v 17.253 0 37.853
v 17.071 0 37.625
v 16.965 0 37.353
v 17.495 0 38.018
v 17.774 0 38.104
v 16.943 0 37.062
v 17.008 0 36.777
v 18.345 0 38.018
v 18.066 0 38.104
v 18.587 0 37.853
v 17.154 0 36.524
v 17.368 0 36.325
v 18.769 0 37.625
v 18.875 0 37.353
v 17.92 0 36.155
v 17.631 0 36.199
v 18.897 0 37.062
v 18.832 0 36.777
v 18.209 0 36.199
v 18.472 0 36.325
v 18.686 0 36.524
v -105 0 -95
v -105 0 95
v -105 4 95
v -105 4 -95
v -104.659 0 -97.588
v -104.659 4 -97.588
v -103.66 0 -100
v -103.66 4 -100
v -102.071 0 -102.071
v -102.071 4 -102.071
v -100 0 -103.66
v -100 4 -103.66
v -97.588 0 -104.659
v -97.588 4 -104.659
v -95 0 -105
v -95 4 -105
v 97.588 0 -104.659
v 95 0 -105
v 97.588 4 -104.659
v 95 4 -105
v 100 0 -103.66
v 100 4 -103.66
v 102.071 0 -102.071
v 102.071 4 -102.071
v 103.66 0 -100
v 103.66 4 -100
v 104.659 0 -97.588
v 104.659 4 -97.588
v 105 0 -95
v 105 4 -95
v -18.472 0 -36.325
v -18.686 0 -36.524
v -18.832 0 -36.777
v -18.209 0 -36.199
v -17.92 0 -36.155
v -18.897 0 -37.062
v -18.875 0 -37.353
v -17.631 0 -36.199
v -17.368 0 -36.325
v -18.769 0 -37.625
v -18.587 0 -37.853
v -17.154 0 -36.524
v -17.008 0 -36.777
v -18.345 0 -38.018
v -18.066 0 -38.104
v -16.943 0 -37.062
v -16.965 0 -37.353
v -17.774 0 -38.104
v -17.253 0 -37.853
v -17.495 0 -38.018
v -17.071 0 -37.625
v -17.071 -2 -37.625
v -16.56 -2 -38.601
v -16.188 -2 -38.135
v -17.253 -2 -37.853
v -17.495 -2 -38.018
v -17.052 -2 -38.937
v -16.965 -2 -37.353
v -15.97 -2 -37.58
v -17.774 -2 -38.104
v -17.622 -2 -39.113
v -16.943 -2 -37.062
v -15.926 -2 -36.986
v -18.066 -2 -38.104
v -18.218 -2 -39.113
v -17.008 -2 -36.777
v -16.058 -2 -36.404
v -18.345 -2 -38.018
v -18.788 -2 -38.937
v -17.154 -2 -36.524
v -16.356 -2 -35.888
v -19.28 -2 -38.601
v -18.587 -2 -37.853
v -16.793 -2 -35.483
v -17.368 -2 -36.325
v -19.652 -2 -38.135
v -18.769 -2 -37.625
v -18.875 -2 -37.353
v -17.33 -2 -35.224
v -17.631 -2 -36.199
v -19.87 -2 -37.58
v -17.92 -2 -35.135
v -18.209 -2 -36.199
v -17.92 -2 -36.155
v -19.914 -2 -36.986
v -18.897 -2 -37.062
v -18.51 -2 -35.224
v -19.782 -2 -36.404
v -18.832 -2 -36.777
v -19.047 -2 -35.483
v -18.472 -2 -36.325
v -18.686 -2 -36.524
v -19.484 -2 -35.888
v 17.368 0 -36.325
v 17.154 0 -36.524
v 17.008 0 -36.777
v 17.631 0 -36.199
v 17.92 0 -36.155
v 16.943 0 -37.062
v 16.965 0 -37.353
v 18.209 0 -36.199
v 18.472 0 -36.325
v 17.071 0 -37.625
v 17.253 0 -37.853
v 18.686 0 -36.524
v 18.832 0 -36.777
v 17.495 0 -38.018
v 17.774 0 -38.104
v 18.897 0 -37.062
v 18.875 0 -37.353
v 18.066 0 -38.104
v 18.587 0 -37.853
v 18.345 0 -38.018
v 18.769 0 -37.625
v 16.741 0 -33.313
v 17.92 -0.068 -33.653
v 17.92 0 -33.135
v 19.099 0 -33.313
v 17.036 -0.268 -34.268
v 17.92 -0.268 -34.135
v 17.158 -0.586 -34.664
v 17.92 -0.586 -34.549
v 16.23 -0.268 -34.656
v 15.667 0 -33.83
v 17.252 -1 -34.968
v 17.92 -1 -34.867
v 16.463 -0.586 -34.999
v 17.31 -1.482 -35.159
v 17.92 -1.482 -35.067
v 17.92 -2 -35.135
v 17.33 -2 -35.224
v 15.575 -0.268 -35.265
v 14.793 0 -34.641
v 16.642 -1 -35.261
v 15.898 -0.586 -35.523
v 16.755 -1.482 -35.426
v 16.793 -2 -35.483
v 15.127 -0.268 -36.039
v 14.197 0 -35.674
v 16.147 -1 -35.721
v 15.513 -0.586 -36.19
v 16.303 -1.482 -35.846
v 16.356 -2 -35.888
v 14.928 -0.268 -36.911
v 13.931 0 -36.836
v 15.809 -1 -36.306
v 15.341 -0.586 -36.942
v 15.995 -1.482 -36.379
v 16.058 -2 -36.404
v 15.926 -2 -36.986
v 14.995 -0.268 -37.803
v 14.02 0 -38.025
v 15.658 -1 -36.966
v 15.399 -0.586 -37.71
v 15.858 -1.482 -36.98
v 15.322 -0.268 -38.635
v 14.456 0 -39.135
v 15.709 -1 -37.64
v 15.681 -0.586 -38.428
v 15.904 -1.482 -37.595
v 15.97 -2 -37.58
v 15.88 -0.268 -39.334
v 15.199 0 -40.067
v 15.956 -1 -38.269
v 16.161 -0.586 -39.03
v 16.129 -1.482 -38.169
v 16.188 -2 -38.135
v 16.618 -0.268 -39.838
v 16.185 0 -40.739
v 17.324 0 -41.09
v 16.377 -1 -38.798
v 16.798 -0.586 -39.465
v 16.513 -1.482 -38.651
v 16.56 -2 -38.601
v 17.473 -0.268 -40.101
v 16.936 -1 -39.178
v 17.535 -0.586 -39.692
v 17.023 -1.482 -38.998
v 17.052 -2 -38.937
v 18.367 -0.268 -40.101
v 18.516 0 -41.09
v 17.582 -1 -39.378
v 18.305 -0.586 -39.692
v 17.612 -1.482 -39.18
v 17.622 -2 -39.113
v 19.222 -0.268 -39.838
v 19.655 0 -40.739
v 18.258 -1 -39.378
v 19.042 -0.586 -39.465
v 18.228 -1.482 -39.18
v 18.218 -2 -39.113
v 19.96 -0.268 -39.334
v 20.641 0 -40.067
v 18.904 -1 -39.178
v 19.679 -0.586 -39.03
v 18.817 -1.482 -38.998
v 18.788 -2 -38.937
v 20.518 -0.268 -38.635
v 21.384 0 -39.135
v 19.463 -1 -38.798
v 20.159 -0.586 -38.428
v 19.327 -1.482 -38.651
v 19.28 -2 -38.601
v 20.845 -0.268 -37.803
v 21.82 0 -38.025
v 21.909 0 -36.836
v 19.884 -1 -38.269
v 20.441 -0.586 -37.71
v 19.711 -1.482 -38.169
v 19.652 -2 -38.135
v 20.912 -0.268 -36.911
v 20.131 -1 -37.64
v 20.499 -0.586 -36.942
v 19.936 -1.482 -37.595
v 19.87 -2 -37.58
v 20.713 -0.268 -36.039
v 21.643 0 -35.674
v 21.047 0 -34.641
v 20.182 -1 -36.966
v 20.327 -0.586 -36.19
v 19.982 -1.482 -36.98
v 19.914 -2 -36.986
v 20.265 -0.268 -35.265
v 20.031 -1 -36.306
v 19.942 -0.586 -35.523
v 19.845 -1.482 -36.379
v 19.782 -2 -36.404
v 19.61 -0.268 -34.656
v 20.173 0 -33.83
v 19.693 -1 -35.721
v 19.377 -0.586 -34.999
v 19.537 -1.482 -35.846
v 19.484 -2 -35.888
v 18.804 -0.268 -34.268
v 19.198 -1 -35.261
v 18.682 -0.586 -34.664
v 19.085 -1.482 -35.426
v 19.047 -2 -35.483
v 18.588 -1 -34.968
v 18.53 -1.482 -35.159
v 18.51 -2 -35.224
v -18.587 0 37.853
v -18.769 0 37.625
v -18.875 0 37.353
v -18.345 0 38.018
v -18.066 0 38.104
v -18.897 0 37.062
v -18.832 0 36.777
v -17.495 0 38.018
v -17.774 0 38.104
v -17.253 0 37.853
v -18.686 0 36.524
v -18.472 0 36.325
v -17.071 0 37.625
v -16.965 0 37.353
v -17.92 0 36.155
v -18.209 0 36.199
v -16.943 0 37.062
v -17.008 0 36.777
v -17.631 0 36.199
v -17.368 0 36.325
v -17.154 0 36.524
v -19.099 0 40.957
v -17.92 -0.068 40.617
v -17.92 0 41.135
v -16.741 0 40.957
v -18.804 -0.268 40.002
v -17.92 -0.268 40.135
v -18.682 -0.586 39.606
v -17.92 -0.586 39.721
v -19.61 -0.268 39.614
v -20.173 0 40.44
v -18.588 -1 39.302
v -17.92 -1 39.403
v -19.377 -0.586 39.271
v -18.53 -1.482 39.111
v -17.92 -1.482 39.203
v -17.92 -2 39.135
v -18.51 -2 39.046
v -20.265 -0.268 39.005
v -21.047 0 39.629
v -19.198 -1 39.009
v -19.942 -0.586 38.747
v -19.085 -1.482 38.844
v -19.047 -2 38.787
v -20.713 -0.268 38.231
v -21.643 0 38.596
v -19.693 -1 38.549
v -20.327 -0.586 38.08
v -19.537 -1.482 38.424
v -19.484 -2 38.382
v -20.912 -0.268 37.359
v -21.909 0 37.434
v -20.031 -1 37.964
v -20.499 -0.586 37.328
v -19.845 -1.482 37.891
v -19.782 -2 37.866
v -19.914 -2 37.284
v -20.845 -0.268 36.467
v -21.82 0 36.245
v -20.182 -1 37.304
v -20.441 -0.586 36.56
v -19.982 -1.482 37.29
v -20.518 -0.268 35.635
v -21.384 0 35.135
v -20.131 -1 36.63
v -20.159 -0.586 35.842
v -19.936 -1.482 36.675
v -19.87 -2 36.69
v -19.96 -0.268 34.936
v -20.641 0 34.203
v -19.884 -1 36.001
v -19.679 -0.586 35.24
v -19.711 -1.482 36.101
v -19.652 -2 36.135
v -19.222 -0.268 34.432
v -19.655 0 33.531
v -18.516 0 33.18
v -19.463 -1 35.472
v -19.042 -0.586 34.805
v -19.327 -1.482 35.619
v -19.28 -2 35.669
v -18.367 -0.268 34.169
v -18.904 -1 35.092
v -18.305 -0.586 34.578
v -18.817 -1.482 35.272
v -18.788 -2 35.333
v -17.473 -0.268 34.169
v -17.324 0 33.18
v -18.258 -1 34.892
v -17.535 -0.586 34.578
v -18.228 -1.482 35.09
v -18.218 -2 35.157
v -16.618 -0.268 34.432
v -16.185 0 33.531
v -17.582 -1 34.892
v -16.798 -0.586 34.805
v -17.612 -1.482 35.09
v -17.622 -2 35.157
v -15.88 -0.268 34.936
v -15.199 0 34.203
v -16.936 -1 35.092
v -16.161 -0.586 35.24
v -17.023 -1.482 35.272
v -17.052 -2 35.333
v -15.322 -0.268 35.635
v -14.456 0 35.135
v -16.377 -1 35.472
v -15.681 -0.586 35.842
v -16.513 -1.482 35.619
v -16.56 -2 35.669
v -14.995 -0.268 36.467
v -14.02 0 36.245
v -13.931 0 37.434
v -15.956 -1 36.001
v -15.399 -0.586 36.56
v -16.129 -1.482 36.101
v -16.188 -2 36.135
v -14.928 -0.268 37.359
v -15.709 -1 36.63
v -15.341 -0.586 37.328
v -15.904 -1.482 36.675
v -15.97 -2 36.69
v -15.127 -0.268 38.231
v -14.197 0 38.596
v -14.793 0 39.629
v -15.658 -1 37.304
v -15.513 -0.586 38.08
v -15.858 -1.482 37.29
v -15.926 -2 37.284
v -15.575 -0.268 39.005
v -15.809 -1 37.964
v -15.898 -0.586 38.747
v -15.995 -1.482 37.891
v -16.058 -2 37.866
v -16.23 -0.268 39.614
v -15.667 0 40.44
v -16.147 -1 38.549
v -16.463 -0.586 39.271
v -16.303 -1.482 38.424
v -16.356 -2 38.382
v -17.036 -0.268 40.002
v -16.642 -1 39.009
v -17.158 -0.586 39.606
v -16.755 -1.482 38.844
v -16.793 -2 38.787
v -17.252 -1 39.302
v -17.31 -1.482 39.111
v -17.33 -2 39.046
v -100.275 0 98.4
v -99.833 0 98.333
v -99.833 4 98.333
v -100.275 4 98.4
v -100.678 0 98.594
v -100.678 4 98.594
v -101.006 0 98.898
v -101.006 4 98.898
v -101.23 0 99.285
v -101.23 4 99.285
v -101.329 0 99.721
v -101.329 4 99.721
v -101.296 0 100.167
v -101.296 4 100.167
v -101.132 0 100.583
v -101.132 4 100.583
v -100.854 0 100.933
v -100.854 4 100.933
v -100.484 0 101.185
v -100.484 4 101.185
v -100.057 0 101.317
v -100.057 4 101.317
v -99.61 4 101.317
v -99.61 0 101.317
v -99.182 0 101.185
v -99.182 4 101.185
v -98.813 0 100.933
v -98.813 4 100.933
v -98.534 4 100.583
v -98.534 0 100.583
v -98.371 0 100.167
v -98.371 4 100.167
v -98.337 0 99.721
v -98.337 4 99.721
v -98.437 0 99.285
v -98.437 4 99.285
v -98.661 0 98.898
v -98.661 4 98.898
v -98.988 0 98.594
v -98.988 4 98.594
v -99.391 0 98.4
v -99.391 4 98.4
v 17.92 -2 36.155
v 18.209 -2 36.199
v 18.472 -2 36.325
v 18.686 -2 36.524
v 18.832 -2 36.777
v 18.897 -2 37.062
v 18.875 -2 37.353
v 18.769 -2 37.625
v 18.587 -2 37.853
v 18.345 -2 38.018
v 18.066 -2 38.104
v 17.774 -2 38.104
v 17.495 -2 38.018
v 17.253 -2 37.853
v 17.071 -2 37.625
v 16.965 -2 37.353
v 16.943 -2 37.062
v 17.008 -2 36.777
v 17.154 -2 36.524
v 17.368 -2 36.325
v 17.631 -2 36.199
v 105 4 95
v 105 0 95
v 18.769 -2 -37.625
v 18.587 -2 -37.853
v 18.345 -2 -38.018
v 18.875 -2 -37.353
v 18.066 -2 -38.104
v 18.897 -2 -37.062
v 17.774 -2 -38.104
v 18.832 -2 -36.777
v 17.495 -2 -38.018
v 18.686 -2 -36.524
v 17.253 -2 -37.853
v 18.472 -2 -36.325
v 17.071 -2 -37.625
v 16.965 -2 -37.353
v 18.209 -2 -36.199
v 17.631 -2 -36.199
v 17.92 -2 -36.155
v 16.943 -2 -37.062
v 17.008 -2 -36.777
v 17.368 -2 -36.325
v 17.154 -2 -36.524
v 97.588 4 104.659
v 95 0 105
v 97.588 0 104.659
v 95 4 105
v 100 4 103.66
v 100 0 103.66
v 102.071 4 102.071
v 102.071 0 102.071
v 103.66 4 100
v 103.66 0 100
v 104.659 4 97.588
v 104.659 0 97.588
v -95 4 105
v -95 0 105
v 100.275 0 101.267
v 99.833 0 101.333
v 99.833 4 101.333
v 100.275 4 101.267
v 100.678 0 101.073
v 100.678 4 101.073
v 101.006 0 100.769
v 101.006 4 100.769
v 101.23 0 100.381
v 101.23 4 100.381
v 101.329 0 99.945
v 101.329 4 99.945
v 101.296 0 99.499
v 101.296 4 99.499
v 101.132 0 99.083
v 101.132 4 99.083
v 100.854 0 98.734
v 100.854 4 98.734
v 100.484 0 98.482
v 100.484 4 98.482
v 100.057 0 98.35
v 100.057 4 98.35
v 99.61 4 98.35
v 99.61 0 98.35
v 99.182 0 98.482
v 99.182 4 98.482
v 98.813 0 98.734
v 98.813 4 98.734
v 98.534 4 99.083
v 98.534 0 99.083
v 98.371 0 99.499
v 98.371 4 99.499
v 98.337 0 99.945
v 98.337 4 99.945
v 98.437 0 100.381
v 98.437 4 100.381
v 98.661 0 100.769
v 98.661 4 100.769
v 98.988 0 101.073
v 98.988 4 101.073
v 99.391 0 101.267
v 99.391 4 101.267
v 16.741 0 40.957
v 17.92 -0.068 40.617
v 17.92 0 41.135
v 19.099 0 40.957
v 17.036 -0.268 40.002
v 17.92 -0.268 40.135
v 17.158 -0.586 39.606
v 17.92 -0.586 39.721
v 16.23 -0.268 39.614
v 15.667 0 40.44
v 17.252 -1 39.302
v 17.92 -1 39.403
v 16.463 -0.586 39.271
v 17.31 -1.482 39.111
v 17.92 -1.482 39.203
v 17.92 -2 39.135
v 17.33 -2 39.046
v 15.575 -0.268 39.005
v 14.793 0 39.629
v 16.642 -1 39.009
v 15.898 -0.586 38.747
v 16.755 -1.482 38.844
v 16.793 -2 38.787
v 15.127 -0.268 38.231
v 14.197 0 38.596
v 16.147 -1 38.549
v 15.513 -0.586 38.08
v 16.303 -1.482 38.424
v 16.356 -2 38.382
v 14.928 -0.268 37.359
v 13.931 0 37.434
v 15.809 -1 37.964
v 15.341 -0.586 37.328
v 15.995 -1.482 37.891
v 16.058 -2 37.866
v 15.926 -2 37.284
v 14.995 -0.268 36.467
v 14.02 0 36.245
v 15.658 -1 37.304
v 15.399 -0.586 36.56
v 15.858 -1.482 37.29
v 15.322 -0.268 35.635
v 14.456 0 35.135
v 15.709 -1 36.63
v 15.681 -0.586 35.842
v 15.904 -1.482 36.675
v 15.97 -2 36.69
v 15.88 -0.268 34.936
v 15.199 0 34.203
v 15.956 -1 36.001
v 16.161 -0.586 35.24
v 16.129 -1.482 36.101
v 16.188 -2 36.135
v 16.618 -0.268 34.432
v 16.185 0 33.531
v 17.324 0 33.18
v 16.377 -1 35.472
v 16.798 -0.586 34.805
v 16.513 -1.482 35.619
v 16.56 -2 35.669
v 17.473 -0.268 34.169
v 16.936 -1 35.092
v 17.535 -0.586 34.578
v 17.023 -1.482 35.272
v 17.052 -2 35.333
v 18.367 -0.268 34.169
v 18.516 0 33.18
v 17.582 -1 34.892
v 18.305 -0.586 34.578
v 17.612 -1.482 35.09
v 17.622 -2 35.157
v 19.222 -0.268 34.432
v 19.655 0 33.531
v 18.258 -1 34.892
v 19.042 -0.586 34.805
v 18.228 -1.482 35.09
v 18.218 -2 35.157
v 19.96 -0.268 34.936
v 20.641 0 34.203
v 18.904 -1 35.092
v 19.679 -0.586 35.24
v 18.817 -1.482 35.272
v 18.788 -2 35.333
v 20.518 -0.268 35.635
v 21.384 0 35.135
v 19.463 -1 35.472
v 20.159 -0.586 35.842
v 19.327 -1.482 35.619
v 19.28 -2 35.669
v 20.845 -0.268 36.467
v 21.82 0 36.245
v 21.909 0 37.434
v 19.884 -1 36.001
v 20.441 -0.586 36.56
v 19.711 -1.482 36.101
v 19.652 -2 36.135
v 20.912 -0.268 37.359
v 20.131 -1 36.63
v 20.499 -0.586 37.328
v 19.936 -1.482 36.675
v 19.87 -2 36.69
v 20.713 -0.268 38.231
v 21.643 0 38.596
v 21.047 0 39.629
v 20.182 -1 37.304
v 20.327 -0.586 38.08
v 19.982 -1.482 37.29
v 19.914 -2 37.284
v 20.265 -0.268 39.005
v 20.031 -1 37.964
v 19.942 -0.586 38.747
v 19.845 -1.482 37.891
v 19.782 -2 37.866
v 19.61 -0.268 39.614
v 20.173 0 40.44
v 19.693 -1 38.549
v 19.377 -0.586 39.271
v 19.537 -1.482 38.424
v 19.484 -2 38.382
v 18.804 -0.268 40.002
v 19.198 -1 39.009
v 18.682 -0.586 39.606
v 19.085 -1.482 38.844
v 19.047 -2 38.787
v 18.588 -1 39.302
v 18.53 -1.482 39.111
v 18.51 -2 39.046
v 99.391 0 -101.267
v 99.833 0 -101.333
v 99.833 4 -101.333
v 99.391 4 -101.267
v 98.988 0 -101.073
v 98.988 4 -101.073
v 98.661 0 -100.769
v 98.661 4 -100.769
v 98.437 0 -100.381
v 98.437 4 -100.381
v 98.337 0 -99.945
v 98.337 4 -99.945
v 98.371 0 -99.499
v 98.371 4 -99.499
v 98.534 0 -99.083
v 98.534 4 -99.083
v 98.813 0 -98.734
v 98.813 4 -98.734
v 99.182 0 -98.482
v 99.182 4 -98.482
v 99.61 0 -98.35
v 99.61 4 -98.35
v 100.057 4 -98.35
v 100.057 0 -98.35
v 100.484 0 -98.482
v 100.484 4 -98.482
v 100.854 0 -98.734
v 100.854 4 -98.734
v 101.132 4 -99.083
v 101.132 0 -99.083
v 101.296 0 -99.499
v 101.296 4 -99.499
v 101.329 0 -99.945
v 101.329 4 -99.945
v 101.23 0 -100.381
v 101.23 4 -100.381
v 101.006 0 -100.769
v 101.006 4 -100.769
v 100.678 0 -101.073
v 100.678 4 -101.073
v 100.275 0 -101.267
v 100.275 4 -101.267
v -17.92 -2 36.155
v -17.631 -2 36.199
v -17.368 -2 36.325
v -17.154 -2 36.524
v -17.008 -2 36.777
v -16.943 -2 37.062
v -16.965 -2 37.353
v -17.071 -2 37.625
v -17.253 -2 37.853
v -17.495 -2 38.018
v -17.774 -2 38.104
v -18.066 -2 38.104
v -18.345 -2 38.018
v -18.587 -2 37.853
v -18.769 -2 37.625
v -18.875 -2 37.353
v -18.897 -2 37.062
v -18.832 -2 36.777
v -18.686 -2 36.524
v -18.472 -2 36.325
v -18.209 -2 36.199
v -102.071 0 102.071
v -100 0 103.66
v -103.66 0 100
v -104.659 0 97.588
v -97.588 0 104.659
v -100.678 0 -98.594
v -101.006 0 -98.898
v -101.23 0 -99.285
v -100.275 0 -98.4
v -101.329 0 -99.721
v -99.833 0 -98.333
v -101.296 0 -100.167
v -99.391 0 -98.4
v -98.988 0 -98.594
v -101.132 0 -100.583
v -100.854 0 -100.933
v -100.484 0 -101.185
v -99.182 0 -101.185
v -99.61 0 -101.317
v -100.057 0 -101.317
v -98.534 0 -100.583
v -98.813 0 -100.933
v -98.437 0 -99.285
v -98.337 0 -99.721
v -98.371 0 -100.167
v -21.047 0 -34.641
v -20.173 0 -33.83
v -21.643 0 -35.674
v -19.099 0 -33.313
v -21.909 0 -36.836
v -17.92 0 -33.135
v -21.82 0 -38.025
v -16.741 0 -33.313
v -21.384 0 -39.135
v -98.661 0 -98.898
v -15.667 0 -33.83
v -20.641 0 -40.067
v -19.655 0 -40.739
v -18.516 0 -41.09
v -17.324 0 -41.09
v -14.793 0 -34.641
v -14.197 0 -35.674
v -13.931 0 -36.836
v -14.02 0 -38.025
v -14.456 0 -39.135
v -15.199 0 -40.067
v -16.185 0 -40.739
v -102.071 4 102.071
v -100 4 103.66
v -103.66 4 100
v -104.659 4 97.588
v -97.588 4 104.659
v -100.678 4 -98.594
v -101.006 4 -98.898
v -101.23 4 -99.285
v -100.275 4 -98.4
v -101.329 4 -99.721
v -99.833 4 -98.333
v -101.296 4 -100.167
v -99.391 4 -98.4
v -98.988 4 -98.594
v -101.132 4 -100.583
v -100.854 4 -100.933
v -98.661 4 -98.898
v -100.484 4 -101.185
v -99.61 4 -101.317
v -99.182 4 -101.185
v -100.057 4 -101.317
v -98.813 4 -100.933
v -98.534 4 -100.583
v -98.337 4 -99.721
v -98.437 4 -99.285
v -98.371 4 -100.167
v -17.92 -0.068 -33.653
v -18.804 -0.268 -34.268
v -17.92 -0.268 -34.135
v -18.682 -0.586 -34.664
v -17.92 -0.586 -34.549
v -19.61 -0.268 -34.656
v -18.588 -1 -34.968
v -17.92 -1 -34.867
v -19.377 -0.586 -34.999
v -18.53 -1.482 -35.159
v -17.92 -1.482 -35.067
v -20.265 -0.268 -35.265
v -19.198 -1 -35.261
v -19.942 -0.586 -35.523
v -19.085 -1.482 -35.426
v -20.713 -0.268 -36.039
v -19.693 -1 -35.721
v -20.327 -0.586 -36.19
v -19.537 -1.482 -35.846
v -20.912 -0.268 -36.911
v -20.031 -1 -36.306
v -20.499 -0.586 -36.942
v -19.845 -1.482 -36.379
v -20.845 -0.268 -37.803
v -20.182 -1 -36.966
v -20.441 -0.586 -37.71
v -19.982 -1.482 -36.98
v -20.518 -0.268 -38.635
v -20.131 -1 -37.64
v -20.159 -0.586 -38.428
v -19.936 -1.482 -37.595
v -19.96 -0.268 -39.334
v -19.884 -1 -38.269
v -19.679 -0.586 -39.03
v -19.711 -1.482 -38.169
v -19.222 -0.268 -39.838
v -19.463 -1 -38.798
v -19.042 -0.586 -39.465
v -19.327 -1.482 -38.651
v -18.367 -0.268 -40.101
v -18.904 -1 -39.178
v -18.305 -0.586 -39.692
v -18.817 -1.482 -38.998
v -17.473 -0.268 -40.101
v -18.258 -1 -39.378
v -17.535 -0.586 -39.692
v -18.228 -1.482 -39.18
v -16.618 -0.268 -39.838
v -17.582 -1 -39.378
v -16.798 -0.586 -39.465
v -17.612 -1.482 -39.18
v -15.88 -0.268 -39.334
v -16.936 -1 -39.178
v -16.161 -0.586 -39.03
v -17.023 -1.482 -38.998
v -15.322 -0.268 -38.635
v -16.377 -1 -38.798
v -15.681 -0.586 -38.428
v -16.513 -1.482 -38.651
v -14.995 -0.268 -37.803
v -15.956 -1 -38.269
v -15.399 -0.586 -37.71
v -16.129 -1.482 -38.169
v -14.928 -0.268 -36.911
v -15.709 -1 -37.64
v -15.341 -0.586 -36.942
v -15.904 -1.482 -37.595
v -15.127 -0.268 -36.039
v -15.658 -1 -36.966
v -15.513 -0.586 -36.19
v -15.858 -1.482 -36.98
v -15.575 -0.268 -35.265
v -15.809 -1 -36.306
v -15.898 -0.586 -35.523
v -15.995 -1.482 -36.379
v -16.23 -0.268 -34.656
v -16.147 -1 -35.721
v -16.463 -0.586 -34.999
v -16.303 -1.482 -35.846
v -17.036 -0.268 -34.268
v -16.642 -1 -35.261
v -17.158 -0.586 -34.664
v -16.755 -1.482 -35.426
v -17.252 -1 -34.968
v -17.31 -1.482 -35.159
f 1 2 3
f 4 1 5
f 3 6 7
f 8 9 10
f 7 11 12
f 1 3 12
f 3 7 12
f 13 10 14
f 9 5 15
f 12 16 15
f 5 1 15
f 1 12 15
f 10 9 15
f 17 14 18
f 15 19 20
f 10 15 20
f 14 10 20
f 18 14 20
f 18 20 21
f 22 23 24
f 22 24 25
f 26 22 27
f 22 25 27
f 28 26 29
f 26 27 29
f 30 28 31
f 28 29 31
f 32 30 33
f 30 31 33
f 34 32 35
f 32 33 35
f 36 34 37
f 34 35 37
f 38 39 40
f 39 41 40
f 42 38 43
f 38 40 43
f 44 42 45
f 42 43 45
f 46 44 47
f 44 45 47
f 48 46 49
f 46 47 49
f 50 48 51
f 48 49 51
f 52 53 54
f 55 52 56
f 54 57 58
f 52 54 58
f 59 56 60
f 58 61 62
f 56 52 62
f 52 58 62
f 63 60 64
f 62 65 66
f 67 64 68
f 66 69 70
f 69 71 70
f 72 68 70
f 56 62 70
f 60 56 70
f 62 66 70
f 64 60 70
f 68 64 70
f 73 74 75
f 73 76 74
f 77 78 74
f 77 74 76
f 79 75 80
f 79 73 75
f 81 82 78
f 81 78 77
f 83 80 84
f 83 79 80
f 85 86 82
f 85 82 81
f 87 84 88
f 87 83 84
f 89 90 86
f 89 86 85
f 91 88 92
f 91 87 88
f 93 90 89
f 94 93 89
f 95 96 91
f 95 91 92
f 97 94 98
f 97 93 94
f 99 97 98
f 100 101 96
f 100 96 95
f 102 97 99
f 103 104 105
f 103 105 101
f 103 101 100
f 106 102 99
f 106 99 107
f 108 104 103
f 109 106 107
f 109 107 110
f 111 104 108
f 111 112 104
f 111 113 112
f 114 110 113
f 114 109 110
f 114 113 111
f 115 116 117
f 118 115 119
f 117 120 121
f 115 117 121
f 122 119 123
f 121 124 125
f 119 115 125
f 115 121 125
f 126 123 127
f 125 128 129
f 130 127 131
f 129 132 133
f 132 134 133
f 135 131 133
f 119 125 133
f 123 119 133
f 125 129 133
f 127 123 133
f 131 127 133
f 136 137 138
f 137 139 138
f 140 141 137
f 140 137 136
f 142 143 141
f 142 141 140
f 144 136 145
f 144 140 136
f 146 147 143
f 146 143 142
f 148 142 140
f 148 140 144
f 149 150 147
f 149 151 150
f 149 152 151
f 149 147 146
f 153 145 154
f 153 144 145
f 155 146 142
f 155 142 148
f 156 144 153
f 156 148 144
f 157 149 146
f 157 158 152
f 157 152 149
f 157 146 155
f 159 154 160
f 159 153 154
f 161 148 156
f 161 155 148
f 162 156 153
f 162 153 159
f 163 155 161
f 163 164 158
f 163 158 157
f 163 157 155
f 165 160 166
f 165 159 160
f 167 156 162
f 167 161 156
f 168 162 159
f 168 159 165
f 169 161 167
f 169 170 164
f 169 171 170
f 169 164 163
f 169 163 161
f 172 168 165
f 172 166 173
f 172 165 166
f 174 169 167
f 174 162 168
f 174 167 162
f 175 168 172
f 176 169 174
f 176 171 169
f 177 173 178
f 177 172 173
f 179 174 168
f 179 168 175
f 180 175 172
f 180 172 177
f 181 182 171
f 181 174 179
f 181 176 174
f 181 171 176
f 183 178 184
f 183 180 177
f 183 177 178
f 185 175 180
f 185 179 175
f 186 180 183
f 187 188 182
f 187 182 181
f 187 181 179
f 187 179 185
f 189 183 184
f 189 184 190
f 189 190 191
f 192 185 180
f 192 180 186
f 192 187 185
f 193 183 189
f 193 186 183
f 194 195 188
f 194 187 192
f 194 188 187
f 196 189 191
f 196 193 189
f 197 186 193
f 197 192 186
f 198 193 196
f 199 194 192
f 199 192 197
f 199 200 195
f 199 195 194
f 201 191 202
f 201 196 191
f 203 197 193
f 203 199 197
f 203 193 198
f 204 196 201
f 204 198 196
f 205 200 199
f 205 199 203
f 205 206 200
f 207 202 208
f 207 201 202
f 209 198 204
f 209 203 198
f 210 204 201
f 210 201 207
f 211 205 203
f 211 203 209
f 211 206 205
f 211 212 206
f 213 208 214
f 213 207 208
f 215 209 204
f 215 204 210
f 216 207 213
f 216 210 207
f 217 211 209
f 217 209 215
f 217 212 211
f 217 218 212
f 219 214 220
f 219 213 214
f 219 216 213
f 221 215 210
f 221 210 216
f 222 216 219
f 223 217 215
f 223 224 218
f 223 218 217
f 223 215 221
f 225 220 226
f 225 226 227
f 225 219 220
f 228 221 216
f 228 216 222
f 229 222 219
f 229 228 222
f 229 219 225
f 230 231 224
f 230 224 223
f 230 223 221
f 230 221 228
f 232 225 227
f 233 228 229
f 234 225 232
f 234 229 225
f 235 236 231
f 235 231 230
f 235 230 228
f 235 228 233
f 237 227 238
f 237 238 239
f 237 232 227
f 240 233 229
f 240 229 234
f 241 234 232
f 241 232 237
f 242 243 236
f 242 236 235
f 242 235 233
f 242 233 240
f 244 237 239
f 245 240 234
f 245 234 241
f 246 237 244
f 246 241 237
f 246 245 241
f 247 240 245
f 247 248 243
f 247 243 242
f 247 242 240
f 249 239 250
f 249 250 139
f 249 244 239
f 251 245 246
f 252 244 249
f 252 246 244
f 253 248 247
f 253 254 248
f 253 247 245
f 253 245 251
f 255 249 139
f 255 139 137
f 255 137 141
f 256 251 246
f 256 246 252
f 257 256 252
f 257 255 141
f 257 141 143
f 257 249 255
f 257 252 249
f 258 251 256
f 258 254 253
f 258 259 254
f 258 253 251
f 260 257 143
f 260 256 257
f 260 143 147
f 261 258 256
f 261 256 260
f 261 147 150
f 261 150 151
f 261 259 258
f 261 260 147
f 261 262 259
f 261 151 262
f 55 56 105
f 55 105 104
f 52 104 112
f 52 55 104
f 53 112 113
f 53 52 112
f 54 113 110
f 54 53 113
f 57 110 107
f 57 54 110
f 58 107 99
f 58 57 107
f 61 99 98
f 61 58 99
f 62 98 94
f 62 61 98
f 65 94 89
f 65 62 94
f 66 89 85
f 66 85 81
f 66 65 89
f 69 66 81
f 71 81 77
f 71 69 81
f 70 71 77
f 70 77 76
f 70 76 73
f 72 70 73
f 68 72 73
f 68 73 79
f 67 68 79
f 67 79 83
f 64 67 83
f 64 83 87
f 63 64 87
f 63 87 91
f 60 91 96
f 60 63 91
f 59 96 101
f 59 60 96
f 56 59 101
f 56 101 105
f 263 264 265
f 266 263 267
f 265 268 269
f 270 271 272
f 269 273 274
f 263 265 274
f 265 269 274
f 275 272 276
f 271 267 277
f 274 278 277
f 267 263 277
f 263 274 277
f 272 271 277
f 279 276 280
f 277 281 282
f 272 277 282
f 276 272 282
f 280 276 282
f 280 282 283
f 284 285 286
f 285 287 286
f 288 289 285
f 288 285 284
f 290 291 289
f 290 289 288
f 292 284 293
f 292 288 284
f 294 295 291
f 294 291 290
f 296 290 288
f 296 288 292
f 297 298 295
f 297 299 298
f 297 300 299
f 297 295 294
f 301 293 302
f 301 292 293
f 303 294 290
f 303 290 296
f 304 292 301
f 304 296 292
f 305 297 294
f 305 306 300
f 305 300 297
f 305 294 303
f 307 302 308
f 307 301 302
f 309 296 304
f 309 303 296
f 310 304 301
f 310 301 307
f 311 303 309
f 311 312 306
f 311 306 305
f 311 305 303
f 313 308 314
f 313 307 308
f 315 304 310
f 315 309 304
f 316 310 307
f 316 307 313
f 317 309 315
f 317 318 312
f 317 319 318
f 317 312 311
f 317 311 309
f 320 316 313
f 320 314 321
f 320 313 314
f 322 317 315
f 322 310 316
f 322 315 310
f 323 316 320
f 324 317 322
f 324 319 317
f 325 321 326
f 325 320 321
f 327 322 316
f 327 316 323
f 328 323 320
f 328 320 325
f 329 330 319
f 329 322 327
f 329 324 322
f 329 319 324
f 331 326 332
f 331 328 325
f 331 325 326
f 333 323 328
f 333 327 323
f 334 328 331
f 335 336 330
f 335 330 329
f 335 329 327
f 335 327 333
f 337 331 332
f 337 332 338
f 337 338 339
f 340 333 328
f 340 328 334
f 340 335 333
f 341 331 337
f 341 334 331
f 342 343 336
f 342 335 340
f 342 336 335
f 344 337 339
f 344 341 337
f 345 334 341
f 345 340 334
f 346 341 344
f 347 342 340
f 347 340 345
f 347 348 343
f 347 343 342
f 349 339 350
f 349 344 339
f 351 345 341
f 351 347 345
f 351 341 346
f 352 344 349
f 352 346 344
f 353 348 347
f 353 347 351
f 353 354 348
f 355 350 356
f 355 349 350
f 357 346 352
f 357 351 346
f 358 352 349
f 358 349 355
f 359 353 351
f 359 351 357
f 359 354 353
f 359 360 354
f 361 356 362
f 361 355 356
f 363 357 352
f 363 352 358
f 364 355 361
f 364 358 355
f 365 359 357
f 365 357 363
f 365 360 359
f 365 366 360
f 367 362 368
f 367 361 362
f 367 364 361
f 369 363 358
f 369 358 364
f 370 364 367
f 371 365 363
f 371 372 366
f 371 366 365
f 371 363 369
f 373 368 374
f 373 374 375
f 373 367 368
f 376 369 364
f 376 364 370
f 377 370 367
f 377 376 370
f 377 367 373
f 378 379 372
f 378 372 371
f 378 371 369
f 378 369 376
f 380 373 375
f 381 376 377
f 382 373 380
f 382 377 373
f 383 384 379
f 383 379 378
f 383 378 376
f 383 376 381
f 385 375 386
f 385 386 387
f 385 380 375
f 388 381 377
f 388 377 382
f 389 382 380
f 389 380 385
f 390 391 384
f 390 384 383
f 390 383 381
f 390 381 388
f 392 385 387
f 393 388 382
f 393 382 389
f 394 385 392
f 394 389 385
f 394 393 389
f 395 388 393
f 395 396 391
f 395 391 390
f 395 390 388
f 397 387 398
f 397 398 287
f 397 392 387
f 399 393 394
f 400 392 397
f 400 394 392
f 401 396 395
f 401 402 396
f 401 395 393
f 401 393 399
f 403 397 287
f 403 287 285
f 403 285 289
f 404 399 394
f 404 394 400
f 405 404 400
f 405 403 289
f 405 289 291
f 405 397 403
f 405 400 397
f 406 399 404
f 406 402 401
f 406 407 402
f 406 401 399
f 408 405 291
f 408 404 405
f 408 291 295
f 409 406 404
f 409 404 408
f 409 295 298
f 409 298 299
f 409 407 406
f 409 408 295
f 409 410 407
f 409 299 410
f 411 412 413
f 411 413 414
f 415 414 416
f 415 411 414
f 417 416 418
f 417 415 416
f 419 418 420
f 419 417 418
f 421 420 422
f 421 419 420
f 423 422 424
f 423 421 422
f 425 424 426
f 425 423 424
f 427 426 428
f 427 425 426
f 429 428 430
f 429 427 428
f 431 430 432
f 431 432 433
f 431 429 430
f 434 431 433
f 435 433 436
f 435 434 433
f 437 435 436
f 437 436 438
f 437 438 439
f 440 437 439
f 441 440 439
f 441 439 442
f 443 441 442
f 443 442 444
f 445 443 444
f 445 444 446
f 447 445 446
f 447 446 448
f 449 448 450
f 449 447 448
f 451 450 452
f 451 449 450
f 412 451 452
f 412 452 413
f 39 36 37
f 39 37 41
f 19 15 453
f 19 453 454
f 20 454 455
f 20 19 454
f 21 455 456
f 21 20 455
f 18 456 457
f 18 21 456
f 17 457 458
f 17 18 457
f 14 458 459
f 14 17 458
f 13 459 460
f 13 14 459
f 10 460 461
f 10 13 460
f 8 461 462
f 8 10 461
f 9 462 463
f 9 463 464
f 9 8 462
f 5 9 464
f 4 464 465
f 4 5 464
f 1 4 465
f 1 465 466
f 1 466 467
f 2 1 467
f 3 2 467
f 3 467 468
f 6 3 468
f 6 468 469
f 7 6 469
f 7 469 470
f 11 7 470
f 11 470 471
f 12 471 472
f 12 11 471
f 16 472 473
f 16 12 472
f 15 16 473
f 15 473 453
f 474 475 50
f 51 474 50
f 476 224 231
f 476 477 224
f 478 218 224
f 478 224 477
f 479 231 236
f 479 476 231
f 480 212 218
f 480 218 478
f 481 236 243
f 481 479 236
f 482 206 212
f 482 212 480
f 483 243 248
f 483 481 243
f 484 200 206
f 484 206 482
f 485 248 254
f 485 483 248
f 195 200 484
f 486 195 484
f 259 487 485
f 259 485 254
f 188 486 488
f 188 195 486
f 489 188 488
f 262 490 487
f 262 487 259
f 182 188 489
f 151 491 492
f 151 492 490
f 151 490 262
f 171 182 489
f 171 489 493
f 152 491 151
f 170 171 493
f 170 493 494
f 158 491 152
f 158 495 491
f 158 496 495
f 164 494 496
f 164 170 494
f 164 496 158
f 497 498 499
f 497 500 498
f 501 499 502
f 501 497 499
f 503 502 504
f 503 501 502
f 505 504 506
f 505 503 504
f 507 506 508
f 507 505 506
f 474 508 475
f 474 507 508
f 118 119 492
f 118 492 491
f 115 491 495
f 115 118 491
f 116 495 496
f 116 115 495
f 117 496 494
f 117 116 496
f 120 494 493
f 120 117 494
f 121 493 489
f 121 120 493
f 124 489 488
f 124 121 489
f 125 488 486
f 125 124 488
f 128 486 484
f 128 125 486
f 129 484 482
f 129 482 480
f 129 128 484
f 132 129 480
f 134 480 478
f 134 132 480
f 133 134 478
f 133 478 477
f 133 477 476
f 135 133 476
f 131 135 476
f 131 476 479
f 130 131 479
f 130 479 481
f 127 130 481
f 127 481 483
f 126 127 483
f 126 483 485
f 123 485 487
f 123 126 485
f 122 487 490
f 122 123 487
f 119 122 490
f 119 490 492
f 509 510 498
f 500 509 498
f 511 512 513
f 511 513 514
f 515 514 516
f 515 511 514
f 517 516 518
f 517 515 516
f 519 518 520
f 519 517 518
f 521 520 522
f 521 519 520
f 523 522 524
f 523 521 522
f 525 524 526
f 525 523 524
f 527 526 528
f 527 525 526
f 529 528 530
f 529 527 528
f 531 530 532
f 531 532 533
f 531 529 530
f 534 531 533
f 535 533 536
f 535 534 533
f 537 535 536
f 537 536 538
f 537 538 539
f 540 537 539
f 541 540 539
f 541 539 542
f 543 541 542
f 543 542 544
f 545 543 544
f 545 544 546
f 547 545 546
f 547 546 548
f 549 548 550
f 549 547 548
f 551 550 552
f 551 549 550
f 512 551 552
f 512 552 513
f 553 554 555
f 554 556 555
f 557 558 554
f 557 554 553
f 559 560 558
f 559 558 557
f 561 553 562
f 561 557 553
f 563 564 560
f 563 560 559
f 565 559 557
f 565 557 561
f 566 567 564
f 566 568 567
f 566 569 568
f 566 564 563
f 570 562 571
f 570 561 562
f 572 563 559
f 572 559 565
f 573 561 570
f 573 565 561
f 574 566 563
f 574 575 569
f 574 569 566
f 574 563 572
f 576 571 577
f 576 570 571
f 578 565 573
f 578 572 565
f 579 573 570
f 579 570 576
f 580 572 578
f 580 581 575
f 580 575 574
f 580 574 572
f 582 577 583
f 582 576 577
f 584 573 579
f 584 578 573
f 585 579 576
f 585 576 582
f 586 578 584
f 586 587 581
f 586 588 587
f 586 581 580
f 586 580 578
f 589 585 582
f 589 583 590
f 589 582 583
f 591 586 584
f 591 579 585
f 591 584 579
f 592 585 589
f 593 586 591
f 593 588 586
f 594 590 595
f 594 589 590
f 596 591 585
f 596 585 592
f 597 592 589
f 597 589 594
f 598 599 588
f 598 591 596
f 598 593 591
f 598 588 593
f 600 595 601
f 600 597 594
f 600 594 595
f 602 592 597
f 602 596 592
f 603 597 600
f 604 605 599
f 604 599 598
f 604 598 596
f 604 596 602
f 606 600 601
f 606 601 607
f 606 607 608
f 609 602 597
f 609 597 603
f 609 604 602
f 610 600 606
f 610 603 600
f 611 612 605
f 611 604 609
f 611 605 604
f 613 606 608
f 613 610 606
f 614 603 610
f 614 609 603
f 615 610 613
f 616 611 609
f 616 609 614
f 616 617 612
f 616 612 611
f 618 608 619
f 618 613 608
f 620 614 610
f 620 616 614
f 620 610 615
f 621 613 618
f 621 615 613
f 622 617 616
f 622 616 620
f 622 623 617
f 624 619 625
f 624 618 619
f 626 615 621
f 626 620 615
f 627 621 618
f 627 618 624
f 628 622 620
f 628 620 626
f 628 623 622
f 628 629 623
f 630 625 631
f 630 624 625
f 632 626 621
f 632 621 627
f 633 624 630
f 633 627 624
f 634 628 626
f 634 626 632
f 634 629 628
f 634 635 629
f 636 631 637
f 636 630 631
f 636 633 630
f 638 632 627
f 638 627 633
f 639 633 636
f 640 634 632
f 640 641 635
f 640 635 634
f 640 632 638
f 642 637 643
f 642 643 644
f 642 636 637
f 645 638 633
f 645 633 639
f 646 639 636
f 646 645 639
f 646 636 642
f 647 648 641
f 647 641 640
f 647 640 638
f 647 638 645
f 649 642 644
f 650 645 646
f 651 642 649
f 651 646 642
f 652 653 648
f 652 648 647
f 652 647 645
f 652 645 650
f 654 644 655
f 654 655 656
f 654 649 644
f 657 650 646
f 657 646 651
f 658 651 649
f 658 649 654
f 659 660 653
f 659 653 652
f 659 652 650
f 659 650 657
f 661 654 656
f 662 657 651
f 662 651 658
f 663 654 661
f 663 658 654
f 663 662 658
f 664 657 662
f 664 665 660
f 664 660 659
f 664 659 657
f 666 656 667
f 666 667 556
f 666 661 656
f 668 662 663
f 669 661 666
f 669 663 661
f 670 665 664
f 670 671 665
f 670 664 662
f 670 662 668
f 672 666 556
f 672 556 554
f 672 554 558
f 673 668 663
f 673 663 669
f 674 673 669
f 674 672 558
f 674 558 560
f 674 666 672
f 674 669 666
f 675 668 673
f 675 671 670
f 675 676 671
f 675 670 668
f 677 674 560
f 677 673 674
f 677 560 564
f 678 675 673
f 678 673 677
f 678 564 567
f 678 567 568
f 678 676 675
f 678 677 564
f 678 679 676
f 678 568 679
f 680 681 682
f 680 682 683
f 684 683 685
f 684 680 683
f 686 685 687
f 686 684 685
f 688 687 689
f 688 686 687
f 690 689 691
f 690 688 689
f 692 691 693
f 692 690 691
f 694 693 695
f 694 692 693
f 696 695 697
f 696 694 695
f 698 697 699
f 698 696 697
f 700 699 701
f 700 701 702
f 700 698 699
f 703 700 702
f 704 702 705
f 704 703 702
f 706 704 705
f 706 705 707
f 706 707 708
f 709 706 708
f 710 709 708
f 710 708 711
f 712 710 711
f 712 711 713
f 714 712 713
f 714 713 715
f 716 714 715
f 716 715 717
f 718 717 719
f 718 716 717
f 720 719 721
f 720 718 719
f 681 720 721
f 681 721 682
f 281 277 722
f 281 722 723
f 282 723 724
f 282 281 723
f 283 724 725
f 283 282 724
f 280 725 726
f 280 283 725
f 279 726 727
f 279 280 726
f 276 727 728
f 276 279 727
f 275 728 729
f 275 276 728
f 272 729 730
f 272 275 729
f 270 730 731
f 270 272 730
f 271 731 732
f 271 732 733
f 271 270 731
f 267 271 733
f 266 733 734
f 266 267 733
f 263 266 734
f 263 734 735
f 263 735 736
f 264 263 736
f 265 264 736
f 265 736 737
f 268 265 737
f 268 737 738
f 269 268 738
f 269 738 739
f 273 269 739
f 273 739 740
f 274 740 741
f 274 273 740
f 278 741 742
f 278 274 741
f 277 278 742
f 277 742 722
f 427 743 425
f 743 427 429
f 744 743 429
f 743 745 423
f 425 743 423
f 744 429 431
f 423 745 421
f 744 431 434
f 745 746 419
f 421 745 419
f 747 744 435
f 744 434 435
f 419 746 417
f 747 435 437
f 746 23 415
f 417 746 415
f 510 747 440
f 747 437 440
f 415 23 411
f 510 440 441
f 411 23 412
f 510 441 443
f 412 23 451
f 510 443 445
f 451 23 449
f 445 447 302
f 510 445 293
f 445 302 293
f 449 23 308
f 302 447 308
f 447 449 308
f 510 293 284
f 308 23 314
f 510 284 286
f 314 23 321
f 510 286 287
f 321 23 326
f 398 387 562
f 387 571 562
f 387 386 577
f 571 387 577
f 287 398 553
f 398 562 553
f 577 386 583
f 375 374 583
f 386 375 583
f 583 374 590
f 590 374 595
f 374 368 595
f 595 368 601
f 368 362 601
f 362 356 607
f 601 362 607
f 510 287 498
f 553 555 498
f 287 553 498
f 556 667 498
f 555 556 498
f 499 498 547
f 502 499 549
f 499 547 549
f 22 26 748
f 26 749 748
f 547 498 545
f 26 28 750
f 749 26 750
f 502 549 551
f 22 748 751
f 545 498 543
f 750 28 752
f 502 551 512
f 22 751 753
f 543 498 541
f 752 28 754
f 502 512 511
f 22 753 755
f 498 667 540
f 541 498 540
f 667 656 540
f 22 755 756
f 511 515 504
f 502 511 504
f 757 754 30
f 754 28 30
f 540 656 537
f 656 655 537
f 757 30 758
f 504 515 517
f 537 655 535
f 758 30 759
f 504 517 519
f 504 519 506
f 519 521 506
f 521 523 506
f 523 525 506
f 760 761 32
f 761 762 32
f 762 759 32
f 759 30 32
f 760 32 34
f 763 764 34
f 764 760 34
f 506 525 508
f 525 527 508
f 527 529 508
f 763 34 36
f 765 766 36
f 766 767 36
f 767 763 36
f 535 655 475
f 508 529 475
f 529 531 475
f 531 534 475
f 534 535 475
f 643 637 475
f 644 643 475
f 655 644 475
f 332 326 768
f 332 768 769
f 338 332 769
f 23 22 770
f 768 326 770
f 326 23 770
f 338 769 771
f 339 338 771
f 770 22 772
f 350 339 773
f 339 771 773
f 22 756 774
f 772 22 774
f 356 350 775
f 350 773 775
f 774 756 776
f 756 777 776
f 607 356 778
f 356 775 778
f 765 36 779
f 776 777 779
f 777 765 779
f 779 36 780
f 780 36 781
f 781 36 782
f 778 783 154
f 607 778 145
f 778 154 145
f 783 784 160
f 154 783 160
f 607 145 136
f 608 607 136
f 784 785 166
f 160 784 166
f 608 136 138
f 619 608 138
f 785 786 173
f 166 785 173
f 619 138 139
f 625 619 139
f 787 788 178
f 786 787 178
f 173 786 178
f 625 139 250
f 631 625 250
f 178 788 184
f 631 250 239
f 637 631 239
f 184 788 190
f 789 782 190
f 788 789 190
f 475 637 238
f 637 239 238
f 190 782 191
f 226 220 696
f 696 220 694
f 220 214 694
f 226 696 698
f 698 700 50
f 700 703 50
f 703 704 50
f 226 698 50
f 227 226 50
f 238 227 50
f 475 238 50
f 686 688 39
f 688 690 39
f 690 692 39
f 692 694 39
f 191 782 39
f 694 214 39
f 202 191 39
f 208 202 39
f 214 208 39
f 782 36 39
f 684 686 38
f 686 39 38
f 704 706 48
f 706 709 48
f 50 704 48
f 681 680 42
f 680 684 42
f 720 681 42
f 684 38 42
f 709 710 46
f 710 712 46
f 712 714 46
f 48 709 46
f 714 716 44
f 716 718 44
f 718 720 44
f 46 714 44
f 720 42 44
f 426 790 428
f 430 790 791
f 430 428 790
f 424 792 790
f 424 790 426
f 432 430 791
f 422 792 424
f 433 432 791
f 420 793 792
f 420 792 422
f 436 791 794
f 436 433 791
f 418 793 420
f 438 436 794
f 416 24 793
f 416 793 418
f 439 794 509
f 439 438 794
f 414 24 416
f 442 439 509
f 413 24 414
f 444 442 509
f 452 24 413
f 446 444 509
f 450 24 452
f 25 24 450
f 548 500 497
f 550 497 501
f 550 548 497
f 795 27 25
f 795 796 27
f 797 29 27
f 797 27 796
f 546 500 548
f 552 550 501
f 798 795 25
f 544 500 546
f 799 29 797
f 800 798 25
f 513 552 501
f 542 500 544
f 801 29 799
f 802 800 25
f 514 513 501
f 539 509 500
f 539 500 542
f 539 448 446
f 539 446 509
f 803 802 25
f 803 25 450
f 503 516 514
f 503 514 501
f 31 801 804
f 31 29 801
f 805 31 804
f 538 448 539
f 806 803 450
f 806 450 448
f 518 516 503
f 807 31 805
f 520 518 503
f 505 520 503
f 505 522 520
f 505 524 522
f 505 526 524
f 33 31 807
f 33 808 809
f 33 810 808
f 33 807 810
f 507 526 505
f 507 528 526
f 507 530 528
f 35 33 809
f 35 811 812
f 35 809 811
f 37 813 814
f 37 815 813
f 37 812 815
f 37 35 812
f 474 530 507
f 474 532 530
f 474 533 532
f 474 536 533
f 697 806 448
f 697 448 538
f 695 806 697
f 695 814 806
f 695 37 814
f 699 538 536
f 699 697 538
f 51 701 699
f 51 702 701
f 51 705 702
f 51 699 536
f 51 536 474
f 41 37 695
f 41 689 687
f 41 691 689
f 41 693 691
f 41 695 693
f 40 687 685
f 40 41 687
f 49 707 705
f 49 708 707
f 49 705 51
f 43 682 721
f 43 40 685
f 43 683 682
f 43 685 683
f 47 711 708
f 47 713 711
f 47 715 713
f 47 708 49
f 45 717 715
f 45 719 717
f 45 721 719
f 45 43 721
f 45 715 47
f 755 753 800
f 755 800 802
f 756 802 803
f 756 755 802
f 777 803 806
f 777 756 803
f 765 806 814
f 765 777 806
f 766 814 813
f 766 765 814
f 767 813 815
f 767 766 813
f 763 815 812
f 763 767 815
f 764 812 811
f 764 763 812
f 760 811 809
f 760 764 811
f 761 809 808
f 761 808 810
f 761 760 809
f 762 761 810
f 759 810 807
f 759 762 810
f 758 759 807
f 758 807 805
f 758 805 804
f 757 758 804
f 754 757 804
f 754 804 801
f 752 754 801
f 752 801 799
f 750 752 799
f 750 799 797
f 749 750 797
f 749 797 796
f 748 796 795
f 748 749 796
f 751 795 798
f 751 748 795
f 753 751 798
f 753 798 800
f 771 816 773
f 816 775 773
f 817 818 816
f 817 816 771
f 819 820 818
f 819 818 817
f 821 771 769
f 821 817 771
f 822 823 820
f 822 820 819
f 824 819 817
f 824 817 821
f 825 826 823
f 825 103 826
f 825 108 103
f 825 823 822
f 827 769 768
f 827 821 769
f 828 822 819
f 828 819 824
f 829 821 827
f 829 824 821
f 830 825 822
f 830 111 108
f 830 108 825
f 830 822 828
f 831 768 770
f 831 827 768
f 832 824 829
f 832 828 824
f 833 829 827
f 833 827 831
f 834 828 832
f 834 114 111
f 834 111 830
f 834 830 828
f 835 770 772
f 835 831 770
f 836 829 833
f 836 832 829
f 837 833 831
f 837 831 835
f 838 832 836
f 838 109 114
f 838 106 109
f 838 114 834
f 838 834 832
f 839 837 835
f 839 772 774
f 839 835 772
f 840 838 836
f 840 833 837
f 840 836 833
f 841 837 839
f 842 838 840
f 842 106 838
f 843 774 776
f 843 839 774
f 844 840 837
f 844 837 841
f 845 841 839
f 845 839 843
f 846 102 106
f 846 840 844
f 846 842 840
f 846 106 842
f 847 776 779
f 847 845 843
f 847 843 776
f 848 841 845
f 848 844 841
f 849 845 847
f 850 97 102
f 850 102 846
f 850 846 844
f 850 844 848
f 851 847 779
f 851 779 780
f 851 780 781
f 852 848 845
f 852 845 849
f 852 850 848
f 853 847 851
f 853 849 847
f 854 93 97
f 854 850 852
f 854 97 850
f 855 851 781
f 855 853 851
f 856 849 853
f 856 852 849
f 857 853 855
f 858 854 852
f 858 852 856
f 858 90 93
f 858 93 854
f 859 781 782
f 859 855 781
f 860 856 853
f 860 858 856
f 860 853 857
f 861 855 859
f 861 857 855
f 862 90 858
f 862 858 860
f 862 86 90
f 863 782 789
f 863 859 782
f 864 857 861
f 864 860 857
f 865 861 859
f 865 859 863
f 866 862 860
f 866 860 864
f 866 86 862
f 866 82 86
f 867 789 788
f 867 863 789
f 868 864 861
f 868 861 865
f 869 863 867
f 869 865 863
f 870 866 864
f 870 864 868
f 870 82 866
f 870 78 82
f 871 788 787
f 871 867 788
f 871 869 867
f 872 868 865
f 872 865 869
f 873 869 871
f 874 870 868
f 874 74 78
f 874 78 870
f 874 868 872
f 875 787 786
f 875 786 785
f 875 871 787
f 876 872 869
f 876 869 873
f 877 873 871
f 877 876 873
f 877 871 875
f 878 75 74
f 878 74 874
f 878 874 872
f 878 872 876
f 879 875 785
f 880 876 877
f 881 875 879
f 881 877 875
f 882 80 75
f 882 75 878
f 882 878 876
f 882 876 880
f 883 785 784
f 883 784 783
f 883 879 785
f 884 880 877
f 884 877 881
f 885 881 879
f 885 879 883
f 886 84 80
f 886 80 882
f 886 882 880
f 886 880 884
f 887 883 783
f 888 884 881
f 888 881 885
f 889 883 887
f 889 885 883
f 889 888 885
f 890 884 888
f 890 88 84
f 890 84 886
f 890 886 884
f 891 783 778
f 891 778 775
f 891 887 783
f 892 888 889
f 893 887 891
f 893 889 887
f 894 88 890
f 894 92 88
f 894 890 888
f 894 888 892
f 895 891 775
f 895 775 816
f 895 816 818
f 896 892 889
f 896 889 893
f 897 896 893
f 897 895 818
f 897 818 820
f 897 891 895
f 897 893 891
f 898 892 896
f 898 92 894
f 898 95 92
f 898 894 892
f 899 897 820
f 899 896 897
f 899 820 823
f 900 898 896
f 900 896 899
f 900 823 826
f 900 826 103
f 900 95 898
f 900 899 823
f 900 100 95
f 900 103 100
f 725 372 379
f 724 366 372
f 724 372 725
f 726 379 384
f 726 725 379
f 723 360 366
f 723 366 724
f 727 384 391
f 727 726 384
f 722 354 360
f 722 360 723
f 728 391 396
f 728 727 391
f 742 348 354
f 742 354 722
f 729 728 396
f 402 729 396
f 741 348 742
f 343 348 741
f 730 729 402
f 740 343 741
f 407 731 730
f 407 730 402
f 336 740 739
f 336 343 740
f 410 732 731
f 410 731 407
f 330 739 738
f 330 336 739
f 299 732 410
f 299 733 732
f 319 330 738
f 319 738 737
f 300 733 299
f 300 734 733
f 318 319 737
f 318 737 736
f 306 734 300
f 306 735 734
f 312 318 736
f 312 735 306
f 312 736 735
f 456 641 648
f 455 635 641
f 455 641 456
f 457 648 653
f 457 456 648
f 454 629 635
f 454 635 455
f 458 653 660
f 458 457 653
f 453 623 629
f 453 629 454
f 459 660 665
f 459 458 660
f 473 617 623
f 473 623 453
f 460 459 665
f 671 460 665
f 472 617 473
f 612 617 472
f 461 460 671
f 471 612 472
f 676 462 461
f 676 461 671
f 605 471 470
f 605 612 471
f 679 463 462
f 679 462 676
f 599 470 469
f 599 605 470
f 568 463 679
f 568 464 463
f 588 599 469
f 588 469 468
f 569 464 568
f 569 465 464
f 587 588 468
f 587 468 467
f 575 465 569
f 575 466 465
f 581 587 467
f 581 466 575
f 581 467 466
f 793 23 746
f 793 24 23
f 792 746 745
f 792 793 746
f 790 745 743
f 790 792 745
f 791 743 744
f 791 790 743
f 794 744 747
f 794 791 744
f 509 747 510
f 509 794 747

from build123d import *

# Parameters (mm, degrees)
SKETCH1_W         = 210
SKETCH1_H         = 210
MAINEXTRUDE_DEPTH = 4
SKETCH1_6_R       = 1.5
SCREWHOLES_DEPTH  = 4
ROUNDEDCORNERS_R  = 10
SKETCH2_R         = 2
SKETCH2_R_2       = 0.98
PCBHOLES_DEPTH    = 2
PCBROUNDS_R       = 2


with BuildPart() as part:
    # Sketch1 → MainExtrude (new body)
    with BuildSketch(Plane(origin=(0, 0, 0), x_dir=(1, 0, 0), z_dir=(0, 1, 0))):
        Rectangle(SKETCH1_W, SKETCH1_H)
    extrude(amount=MAINEXTRUDE_DEPTH)

    # Sketch1<6> → ScrewHoles (cut)
    with BuildSketch(Plane(origin=(0, 0, 0), x_dir=(1, 0, 0), z_dir=(0, 1, 0))):
        with Locations(Location((-99.833273811, 99.833273811, 0), (0, 0, 270))):
            Circle(SKETCH1_6_R)
        with Locations(Location((-99.833273811, -99.833273811, 0), (0, 0, 90))):
            Circle(SKETCH1_6_R)
        with Locations(Location((99.833273811, -99.833273811, 0), (0, 0, 270))):
            Circle(SKETCH1_6_R)
        with Locations(Location((99.833273811, 99.833273811, 0), (0, 0, 90))):
            Circle(SKETCH1_6_R)
    extrude(amount=SCREWHOLES_DEPTH, mode=Mode.SUBTRACT)

    # RoundedCorners
    roundedcorners_edges = [part.edges().sort_by_distance(p)[0] for p in [
        (-105, 2, -105),
        (-105, 2, 105),
        (105, 2, 105),
        (105, 2, -105),
    ]]
    fillet(roundedcorners_edges, radius=ROUNDEDCORNERS_R)

    # Sketch2 → PCBHoles (add)
    # profile 1 of 4: a face of its own
    with BuildSketch(Plane.XZ):
        with Locations(Location((-17.92, 37.135, 0), (0, 0, 90))):
            Circle(SKETCH2_R)
        with Locations(Location((-17.92, 37.135, 0), (0, 0, 270))):
            Circle(SKETCH2_R_2, mode=Mode.SUBTRACT)
    # profile 2 of 4: a face of its own
    with BuildSketch(Plane.XZ):
        with Locations(Location((17.92, 37.135, 0), (0, 0, 90))):
            Circle(SKETCH2_R)
        with Locations(Location((17.92, 37.135, 0), (0, 0, 270))):
            Circle(SKETCH2_R_2, mode=Mode.SUBTRACT)
    # profile 3 of 4: a face of its own
    with BuildSketch(Plane.XZ):
        with Locations(Location((-17.92, -37.135, 0), (0, 0, 90))):
            Circle(SKETCH2_R)
        with Locations(Location((-17.92, -37.135, 0), (0, 0, 90))):
            Circle(SKETCH2_R_2, mode=Mode.SUBTRACT)
    # profile 4 of 4: a face of its own
    with BuildSketch(Plane.XZ):
        with Locations(Location((17.92, -37.135, 0), (0, 0, 90))):
            Circle(SKETCH2_R)
        with Locations(Location((17.92, -37.135, 0), (0, 0, 90))):
            Circle(SKETCH2_R_2, mode=Mode.SUBTRACT)
    extrude(amount=PCBHOLES_DEPTH)

    # PCBRounds
    pcbrounds_edges = [part.edges().sort_by_distance(p)[0] for p in [
        (-17.92, 0, -39.135),
        (17.92, 0, -39.135),
        (-17.92, 0, 35.135),
        (17.92, 0, 35.135),
    ]]
    fillet(pcbrounds_edges, radius=PCBROUNDS_R - 0.0001)  # a hair under: the kernel refuses the full size


solid = part.part
